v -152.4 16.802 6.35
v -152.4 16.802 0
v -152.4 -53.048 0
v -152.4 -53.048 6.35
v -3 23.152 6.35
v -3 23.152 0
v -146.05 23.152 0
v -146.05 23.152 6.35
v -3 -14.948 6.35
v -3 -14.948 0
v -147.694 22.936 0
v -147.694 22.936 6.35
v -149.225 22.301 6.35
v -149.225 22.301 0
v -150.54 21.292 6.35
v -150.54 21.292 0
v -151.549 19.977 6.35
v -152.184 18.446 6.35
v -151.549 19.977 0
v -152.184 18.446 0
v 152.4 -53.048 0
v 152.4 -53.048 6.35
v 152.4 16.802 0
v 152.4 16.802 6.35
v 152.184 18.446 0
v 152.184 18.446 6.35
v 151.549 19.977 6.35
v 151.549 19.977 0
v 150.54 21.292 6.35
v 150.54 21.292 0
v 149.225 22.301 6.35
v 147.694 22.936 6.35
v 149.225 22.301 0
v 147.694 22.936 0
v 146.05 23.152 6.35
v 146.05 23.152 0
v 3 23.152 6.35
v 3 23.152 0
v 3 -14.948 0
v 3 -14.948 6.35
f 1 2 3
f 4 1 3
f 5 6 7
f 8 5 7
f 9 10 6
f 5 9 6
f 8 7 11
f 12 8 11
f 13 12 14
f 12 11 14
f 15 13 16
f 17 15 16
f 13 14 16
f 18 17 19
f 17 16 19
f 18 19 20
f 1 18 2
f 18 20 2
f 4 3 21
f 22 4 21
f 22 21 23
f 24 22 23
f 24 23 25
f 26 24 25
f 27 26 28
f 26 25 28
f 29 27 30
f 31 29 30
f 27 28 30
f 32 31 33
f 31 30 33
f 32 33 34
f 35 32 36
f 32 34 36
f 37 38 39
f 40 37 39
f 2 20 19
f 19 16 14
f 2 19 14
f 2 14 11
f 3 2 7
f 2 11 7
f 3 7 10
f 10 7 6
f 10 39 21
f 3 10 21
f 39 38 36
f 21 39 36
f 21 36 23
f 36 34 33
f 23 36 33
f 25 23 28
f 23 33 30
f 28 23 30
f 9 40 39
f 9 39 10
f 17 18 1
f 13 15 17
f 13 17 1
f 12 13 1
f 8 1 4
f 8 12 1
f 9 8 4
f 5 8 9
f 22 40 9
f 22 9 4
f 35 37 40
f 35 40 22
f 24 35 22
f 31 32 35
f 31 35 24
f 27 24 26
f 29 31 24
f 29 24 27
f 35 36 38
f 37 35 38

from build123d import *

# Parameters (mm, degrees)
F1_DEPTH = 6.35


with BuildPart() as f1:
    # F0 (on Top) → F1 (new body)
    with BuildSketch(Plane.XY):
        with BuildLine():
            Line((-3, 23.152184), (-146.05, 23.152184))
            ThreePointArc((-146.05, 23.152184), (-150.540128, 21.292312), (-152.4, 16.802184))
            Line((-152.4, 16.802184), (-152.4, -53.047816))
            Line((-152.4, -53.047816), (152.4, -53.047816))
            Line((152.4, -53.047816), (152.4, 16.802184))
            ThreePointArc((152.4, 16.802184), (150.540128, 21.292312), (146.05, 23.152184))
            Line((146.05, 23.152184), (3, 23.152184))
            Line((3, 23.152184), (3, -14.947816))
            Line((3, -14.947816), (-3, -14.947816))
            Line((-3, -14.947816), (-3, 23.152184))
        make_face()
    extrude(amount=F1_DEPTH)


solid = f1.part
